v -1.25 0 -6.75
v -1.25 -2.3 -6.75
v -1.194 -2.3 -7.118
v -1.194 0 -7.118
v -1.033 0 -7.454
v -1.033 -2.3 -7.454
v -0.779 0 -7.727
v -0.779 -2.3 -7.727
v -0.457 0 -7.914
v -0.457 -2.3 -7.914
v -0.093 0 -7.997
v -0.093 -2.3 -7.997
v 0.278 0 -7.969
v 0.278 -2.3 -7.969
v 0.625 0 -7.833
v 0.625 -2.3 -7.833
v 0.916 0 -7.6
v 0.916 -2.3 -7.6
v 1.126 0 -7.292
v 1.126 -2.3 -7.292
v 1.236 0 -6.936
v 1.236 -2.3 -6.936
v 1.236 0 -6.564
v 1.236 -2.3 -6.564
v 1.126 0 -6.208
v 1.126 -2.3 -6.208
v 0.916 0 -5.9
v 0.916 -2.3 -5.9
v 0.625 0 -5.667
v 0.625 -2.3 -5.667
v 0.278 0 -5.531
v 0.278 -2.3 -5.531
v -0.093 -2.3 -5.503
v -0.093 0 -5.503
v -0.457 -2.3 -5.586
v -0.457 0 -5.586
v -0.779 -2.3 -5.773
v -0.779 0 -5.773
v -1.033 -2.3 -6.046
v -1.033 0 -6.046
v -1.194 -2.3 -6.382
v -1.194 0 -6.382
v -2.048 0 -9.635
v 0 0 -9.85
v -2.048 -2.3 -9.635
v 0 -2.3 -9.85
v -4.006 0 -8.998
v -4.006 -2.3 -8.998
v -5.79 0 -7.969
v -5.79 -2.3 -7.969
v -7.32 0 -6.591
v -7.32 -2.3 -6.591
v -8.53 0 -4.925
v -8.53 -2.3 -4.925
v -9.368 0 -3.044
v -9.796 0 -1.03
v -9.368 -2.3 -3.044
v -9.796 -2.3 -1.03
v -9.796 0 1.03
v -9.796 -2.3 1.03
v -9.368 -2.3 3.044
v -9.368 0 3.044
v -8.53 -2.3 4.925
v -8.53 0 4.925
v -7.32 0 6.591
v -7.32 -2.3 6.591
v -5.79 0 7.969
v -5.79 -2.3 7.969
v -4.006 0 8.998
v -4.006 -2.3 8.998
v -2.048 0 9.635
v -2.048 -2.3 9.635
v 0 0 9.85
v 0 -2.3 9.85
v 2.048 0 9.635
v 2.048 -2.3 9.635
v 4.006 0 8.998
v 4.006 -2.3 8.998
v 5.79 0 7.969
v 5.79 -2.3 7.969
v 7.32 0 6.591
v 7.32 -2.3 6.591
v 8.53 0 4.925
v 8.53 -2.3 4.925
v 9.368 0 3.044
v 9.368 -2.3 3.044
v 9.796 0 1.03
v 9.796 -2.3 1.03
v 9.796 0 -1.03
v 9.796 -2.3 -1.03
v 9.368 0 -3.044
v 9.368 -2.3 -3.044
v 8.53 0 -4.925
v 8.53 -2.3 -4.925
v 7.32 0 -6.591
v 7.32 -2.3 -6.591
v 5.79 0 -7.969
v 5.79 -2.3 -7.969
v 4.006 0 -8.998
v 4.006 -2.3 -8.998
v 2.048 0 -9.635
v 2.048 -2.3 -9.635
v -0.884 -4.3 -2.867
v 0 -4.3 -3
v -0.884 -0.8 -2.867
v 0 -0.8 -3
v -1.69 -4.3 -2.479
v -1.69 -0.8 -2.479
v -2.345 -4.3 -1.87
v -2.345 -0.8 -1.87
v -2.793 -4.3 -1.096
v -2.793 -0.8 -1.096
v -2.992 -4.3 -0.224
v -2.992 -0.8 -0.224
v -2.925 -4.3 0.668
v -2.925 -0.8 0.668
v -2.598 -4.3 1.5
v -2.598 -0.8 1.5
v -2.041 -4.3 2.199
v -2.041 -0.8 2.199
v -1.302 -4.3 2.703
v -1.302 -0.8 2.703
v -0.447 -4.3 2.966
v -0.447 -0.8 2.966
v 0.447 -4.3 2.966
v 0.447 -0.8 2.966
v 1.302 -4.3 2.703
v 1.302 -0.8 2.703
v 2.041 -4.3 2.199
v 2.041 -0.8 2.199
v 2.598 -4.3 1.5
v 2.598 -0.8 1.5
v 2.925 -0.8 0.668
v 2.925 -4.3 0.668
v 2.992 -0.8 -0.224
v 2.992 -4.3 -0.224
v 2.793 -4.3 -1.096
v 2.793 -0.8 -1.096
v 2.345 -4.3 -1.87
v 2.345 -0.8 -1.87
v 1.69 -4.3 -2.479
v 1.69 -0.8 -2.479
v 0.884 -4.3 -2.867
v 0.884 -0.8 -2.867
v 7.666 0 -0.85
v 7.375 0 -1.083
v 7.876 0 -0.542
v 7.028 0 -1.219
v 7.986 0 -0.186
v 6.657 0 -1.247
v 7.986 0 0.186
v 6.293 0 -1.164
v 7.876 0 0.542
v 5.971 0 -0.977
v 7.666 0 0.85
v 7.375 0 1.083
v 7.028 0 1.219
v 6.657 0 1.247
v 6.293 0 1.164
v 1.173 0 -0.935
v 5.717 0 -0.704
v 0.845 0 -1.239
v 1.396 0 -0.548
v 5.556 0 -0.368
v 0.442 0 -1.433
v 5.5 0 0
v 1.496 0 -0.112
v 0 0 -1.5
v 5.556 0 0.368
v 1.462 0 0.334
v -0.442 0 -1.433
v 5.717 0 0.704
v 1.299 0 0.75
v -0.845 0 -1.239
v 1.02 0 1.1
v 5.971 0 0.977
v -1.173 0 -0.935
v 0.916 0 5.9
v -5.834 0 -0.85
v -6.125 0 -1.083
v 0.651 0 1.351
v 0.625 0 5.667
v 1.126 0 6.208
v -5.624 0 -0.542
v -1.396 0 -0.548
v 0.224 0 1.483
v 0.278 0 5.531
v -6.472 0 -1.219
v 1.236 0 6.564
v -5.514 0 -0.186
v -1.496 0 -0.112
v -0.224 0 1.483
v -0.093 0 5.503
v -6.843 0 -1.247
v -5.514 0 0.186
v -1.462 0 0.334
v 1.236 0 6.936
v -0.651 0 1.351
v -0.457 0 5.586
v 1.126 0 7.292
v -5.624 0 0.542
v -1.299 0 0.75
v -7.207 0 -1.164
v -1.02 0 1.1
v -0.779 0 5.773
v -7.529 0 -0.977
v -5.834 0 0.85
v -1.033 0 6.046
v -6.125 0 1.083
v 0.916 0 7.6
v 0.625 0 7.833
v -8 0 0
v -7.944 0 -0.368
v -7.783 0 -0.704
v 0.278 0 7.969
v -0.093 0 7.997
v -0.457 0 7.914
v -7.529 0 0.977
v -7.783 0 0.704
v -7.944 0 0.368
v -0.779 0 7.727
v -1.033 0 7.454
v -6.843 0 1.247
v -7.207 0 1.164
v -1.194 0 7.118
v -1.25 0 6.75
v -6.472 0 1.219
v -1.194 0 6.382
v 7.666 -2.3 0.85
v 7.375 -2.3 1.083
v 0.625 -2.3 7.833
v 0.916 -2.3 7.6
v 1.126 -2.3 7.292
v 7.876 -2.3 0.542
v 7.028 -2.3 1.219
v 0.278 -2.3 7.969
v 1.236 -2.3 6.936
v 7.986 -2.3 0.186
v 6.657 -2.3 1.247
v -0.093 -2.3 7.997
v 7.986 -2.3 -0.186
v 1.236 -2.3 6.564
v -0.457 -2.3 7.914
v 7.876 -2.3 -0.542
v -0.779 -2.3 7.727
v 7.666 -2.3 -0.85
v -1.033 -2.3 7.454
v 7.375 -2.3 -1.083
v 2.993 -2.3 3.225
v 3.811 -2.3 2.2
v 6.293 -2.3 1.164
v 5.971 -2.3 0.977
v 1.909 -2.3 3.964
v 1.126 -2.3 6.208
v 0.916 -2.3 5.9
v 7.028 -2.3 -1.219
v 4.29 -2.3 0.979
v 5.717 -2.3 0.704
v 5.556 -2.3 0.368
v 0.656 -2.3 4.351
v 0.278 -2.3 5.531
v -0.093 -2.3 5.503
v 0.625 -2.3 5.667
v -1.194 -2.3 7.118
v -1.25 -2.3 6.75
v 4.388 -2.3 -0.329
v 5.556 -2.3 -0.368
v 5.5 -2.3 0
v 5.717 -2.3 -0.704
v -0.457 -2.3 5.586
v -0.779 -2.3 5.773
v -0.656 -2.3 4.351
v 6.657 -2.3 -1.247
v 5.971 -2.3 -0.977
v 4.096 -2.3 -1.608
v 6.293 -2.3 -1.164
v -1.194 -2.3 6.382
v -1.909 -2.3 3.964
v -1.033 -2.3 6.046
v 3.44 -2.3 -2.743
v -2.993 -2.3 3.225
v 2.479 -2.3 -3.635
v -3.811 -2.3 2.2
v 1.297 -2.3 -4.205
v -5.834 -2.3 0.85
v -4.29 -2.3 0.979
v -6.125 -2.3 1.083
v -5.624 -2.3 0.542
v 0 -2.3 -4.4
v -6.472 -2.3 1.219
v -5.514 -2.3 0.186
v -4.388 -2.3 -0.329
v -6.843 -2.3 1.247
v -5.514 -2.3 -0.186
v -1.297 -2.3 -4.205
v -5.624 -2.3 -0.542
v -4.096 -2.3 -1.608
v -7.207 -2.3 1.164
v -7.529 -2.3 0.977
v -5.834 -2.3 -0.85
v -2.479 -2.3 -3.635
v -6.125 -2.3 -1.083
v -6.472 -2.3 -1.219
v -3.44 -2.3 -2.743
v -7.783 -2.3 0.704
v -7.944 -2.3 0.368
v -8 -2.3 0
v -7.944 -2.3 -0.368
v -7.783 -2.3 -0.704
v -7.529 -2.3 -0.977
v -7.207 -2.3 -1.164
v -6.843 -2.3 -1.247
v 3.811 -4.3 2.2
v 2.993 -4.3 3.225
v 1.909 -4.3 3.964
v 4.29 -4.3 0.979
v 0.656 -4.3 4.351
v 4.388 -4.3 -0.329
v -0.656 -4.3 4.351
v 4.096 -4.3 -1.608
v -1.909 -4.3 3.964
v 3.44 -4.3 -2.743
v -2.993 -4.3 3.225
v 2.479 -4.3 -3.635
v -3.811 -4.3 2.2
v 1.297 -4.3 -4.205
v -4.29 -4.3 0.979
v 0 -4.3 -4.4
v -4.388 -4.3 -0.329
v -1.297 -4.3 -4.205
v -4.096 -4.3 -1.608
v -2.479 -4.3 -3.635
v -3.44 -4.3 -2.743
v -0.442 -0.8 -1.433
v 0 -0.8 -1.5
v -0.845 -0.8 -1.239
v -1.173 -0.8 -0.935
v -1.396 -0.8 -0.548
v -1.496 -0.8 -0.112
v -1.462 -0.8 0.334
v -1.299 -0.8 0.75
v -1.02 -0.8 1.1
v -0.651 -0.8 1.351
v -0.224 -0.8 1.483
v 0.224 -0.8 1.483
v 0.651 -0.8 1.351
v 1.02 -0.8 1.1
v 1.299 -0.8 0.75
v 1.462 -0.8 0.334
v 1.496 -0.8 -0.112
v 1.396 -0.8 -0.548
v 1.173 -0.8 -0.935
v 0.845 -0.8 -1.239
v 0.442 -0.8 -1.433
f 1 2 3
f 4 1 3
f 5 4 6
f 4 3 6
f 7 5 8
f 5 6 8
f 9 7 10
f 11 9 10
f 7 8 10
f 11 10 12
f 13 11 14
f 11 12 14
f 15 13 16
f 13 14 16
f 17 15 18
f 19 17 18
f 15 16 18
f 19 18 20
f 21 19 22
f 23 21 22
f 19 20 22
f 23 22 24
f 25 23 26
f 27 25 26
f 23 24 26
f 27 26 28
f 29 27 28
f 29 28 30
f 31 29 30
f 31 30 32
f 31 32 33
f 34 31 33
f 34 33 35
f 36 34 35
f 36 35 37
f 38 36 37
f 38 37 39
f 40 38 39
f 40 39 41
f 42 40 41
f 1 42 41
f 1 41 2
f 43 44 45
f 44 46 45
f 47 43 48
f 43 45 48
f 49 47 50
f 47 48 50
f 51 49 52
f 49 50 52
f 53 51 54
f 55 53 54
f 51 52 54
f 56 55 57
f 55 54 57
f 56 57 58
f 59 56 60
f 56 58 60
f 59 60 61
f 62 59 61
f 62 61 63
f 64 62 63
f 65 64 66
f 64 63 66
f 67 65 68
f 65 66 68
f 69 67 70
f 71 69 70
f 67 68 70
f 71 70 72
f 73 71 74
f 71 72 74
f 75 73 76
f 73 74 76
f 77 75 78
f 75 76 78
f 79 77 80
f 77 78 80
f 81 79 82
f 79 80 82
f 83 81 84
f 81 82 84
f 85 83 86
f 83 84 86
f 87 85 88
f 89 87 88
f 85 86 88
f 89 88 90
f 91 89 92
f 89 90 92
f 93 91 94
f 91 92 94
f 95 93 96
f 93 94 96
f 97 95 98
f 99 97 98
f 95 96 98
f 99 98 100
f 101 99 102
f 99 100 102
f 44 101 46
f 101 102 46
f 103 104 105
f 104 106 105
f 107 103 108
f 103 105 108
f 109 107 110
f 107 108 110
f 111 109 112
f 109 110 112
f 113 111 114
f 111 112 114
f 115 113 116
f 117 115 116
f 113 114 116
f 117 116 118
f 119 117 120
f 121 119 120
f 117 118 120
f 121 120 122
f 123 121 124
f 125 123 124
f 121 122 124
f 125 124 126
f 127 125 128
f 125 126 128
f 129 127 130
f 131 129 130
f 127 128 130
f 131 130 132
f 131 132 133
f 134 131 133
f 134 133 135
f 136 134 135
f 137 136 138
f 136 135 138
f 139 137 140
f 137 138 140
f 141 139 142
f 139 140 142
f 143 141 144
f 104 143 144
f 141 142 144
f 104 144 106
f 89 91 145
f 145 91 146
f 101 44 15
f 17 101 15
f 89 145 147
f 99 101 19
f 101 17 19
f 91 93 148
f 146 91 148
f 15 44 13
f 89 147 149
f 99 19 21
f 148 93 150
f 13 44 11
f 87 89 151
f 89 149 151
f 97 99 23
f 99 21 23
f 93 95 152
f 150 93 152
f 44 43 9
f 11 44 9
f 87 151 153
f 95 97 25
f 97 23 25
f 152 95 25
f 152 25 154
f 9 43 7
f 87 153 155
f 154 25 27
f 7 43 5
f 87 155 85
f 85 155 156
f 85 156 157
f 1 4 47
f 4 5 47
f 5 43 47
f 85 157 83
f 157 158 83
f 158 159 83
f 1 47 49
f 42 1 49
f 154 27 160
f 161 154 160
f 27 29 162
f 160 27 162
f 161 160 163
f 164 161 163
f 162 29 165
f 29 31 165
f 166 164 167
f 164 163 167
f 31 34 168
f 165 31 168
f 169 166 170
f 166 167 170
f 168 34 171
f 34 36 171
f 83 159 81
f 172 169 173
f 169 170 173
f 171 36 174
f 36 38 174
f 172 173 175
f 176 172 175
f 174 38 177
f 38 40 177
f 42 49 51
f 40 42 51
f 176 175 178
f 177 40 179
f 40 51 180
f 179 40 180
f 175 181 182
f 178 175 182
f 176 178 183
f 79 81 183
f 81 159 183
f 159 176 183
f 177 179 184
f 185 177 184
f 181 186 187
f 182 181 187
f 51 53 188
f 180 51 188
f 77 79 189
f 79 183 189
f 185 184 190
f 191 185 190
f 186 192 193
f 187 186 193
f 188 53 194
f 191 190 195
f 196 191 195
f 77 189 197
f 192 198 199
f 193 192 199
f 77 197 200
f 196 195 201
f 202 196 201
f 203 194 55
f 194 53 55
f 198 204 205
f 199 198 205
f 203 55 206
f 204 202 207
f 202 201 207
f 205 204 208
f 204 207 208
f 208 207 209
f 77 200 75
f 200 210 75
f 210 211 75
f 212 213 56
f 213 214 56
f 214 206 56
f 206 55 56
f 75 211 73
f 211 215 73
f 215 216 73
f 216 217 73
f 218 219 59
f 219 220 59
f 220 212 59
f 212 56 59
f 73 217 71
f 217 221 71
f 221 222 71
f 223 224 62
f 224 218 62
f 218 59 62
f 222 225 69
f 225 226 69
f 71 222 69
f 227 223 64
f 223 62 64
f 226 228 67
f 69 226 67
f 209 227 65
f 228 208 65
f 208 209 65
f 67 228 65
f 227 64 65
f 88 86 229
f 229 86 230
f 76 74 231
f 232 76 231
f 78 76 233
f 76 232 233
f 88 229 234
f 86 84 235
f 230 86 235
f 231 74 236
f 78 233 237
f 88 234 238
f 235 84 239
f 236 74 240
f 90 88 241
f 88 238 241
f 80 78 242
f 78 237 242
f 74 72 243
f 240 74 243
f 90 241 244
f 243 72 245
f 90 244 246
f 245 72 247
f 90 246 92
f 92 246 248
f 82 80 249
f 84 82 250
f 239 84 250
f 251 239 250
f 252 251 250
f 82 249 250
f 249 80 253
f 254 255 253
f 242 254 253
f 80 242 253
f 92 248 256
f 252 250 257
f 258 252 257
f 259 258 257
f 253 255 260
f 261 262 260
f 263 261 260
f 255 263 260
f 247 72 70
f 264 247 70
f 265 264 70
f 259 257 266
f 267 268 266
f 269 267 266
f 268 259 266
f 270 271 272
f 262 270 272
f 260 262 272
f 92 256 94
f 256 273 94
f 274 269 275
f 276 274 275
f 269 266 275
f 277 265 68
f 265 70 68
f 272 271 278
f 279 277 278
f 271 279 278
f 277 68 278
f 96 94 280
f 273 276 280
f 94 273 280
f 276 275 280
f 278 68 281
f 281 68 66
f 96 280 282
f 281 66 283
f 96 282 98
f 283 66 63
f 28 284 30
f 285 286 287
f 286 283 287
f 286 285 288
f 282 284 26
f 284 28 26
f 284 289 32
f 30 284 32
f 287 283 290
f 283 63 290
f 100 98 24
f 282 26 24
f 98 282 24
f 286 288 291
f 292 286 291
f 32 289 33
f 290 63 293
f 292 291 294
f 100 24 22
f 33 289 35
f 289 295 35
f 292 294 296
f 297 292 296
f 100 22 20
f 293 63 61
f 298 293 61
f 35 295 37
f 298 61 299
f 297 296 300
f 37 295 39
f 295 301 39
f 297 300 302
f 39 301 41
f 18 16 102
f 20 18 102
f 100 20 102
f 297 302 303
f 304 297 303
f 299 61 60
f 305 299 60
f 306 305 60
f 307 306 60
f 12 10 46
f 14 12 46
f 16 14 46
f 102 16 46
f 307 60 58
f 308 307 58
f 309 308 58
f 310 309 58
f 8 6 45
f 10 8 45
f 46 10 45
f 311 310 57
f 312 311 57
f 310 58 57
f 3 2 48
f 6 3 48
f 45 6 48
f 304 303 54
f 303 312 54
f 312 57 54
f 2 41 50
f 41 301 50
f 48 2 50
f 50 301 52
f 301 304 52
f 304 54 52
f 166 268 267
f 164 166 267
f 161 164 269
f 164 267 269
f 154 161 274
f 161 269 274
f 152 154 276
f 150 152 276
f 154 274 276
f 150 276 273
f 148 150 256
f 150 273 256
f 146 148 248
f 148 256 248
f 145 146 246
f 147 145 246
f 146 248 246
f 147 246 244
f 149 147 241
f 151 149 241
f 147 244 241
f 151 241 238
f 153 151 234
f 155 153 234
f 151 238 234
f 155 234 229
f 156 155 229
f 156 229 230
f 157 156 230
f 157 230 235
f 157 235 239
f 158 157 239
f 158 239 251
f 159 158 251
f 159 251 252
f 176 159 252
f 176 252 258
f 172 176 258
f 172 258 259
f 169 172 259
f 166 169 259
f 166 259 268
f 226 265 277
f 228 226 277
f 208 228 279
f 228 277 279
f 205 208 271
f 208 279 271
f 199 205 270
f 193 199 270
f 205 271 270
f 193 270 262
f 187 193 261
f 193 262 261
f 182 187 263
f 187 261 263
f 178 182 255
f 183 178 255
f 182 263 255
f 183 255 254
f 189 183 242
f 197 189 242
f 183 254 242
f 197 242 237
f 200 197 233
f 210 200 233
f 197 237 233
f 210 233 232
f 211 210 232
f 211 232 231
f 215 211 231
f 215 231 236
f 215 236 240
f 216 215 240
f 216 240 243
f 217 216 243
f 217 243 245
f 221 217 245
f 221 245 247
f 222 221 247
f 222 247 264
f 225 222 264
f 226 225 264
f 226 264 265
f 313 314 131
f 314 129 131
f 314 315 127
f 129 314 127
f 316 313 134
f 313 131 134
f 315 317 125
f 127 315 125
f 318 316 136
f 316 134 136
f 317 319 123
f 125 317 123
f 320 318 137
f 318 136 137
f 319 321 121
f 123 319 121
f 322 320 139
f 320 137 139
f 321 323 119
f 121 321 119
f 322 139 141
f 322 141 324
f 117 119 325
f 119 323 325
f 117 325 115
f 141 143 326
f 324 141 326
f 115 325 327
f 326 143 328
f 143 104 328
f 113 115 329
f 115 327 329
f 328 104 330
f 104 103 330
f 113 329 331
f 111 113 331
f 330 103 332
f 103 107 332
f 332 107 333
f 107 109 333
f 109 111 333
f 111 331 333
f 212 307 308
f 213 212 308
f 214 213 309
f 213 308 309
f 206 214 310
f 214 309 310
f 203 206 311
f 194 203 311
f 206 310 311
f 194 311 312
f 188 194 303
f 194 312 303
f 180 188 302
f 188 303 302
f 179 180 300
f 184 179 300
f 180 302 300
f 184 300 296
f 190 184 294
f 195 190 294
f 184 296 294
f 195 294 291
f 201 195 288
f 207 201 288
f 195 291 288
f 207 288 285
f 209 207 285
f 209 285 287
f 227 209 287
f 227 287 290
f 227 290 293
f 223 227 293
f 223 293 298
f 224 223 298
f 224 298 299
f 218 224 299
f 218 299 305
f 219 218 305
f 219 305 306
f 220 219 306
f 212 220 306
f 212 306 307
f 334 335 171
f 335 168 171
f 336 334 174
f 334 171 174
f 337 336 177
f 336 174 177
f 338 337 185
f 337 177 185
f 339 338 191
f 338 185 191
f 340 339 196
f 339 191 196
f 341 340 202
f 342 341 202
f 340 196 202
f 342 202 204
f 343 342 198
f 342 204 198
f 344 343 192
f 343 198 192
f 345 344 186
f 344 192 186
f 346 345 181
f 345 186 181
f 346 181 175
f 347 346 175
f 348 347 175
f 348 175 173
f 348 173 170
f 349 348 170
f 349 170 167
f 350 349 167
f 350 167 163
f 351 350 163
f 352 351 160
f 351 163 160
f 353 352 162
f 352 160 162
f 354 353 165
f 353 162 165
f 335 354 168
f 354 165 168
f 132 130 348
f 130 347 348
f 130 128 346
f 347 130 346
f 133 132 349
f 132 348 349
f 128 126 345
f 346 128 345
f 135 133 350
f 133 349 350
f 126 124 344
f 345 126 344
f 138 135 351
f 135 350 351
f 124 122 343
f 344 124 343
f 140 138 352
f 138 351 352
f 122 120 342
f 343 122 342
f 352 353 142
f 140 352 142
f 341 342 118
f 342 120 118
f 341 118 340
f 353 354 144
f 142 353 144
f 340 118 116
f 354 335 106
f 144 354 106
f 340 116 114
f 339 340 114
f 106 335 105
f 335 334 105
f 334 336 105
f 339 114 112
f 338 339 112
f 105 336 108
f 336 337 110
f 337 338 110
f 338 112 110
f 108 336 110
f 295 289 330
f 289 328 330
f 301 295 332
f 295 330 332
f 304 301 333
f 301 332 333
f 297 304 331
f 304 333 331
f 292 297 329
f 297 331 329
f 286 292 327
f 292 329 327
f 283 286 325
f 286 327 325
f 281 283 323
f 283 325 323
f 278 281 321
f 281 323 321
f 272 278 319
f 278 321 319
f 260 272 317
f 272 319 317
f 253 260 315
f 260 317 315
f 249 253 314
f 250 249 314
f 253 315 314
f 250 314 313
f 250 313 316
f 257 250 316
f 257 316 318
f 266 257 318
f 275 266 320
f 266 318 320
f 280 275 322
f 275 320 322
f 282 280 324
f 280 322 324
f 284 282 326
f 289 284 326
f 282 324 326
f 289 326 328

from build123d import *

# Parameters (mm, degrees)
HOLE_WIZARD_M3_1_D = 2.5


with BuildPart() as part:
    # 草图1 → 旋转1 (revolve)
    with BuildSketch(Plane.XY, mode=Mode.PRIVATE) as revolve_1_sk:
        Polygon((1.5, 0), (9.85, 0), (9.85, -2.3), (4.4, -2.3), (4.4, -4.3), (3, -4.3), (3, -0.8), (1.5, -0.8), align=None)
    revolve(revolve_1_sk.sketch.rotate(Axis((0, 0, 0), (0, 1, 0)), 90), axis=Axis((0, 0, 0), (0, 1, 0)))

    # M3 螺纹孔1 (through all)
    with Locations(Plane(origin=(0, 0, 0), x_dir=(1, 0, 0), z_dir=(0, 1, 0))):
        with Locations((0, 6.75), (6.75, 0), (0, -6.75), (-6.75, 0)):
            Hole(HOLE_WIZARD_M3_1_D / 2)


solid = part.part
